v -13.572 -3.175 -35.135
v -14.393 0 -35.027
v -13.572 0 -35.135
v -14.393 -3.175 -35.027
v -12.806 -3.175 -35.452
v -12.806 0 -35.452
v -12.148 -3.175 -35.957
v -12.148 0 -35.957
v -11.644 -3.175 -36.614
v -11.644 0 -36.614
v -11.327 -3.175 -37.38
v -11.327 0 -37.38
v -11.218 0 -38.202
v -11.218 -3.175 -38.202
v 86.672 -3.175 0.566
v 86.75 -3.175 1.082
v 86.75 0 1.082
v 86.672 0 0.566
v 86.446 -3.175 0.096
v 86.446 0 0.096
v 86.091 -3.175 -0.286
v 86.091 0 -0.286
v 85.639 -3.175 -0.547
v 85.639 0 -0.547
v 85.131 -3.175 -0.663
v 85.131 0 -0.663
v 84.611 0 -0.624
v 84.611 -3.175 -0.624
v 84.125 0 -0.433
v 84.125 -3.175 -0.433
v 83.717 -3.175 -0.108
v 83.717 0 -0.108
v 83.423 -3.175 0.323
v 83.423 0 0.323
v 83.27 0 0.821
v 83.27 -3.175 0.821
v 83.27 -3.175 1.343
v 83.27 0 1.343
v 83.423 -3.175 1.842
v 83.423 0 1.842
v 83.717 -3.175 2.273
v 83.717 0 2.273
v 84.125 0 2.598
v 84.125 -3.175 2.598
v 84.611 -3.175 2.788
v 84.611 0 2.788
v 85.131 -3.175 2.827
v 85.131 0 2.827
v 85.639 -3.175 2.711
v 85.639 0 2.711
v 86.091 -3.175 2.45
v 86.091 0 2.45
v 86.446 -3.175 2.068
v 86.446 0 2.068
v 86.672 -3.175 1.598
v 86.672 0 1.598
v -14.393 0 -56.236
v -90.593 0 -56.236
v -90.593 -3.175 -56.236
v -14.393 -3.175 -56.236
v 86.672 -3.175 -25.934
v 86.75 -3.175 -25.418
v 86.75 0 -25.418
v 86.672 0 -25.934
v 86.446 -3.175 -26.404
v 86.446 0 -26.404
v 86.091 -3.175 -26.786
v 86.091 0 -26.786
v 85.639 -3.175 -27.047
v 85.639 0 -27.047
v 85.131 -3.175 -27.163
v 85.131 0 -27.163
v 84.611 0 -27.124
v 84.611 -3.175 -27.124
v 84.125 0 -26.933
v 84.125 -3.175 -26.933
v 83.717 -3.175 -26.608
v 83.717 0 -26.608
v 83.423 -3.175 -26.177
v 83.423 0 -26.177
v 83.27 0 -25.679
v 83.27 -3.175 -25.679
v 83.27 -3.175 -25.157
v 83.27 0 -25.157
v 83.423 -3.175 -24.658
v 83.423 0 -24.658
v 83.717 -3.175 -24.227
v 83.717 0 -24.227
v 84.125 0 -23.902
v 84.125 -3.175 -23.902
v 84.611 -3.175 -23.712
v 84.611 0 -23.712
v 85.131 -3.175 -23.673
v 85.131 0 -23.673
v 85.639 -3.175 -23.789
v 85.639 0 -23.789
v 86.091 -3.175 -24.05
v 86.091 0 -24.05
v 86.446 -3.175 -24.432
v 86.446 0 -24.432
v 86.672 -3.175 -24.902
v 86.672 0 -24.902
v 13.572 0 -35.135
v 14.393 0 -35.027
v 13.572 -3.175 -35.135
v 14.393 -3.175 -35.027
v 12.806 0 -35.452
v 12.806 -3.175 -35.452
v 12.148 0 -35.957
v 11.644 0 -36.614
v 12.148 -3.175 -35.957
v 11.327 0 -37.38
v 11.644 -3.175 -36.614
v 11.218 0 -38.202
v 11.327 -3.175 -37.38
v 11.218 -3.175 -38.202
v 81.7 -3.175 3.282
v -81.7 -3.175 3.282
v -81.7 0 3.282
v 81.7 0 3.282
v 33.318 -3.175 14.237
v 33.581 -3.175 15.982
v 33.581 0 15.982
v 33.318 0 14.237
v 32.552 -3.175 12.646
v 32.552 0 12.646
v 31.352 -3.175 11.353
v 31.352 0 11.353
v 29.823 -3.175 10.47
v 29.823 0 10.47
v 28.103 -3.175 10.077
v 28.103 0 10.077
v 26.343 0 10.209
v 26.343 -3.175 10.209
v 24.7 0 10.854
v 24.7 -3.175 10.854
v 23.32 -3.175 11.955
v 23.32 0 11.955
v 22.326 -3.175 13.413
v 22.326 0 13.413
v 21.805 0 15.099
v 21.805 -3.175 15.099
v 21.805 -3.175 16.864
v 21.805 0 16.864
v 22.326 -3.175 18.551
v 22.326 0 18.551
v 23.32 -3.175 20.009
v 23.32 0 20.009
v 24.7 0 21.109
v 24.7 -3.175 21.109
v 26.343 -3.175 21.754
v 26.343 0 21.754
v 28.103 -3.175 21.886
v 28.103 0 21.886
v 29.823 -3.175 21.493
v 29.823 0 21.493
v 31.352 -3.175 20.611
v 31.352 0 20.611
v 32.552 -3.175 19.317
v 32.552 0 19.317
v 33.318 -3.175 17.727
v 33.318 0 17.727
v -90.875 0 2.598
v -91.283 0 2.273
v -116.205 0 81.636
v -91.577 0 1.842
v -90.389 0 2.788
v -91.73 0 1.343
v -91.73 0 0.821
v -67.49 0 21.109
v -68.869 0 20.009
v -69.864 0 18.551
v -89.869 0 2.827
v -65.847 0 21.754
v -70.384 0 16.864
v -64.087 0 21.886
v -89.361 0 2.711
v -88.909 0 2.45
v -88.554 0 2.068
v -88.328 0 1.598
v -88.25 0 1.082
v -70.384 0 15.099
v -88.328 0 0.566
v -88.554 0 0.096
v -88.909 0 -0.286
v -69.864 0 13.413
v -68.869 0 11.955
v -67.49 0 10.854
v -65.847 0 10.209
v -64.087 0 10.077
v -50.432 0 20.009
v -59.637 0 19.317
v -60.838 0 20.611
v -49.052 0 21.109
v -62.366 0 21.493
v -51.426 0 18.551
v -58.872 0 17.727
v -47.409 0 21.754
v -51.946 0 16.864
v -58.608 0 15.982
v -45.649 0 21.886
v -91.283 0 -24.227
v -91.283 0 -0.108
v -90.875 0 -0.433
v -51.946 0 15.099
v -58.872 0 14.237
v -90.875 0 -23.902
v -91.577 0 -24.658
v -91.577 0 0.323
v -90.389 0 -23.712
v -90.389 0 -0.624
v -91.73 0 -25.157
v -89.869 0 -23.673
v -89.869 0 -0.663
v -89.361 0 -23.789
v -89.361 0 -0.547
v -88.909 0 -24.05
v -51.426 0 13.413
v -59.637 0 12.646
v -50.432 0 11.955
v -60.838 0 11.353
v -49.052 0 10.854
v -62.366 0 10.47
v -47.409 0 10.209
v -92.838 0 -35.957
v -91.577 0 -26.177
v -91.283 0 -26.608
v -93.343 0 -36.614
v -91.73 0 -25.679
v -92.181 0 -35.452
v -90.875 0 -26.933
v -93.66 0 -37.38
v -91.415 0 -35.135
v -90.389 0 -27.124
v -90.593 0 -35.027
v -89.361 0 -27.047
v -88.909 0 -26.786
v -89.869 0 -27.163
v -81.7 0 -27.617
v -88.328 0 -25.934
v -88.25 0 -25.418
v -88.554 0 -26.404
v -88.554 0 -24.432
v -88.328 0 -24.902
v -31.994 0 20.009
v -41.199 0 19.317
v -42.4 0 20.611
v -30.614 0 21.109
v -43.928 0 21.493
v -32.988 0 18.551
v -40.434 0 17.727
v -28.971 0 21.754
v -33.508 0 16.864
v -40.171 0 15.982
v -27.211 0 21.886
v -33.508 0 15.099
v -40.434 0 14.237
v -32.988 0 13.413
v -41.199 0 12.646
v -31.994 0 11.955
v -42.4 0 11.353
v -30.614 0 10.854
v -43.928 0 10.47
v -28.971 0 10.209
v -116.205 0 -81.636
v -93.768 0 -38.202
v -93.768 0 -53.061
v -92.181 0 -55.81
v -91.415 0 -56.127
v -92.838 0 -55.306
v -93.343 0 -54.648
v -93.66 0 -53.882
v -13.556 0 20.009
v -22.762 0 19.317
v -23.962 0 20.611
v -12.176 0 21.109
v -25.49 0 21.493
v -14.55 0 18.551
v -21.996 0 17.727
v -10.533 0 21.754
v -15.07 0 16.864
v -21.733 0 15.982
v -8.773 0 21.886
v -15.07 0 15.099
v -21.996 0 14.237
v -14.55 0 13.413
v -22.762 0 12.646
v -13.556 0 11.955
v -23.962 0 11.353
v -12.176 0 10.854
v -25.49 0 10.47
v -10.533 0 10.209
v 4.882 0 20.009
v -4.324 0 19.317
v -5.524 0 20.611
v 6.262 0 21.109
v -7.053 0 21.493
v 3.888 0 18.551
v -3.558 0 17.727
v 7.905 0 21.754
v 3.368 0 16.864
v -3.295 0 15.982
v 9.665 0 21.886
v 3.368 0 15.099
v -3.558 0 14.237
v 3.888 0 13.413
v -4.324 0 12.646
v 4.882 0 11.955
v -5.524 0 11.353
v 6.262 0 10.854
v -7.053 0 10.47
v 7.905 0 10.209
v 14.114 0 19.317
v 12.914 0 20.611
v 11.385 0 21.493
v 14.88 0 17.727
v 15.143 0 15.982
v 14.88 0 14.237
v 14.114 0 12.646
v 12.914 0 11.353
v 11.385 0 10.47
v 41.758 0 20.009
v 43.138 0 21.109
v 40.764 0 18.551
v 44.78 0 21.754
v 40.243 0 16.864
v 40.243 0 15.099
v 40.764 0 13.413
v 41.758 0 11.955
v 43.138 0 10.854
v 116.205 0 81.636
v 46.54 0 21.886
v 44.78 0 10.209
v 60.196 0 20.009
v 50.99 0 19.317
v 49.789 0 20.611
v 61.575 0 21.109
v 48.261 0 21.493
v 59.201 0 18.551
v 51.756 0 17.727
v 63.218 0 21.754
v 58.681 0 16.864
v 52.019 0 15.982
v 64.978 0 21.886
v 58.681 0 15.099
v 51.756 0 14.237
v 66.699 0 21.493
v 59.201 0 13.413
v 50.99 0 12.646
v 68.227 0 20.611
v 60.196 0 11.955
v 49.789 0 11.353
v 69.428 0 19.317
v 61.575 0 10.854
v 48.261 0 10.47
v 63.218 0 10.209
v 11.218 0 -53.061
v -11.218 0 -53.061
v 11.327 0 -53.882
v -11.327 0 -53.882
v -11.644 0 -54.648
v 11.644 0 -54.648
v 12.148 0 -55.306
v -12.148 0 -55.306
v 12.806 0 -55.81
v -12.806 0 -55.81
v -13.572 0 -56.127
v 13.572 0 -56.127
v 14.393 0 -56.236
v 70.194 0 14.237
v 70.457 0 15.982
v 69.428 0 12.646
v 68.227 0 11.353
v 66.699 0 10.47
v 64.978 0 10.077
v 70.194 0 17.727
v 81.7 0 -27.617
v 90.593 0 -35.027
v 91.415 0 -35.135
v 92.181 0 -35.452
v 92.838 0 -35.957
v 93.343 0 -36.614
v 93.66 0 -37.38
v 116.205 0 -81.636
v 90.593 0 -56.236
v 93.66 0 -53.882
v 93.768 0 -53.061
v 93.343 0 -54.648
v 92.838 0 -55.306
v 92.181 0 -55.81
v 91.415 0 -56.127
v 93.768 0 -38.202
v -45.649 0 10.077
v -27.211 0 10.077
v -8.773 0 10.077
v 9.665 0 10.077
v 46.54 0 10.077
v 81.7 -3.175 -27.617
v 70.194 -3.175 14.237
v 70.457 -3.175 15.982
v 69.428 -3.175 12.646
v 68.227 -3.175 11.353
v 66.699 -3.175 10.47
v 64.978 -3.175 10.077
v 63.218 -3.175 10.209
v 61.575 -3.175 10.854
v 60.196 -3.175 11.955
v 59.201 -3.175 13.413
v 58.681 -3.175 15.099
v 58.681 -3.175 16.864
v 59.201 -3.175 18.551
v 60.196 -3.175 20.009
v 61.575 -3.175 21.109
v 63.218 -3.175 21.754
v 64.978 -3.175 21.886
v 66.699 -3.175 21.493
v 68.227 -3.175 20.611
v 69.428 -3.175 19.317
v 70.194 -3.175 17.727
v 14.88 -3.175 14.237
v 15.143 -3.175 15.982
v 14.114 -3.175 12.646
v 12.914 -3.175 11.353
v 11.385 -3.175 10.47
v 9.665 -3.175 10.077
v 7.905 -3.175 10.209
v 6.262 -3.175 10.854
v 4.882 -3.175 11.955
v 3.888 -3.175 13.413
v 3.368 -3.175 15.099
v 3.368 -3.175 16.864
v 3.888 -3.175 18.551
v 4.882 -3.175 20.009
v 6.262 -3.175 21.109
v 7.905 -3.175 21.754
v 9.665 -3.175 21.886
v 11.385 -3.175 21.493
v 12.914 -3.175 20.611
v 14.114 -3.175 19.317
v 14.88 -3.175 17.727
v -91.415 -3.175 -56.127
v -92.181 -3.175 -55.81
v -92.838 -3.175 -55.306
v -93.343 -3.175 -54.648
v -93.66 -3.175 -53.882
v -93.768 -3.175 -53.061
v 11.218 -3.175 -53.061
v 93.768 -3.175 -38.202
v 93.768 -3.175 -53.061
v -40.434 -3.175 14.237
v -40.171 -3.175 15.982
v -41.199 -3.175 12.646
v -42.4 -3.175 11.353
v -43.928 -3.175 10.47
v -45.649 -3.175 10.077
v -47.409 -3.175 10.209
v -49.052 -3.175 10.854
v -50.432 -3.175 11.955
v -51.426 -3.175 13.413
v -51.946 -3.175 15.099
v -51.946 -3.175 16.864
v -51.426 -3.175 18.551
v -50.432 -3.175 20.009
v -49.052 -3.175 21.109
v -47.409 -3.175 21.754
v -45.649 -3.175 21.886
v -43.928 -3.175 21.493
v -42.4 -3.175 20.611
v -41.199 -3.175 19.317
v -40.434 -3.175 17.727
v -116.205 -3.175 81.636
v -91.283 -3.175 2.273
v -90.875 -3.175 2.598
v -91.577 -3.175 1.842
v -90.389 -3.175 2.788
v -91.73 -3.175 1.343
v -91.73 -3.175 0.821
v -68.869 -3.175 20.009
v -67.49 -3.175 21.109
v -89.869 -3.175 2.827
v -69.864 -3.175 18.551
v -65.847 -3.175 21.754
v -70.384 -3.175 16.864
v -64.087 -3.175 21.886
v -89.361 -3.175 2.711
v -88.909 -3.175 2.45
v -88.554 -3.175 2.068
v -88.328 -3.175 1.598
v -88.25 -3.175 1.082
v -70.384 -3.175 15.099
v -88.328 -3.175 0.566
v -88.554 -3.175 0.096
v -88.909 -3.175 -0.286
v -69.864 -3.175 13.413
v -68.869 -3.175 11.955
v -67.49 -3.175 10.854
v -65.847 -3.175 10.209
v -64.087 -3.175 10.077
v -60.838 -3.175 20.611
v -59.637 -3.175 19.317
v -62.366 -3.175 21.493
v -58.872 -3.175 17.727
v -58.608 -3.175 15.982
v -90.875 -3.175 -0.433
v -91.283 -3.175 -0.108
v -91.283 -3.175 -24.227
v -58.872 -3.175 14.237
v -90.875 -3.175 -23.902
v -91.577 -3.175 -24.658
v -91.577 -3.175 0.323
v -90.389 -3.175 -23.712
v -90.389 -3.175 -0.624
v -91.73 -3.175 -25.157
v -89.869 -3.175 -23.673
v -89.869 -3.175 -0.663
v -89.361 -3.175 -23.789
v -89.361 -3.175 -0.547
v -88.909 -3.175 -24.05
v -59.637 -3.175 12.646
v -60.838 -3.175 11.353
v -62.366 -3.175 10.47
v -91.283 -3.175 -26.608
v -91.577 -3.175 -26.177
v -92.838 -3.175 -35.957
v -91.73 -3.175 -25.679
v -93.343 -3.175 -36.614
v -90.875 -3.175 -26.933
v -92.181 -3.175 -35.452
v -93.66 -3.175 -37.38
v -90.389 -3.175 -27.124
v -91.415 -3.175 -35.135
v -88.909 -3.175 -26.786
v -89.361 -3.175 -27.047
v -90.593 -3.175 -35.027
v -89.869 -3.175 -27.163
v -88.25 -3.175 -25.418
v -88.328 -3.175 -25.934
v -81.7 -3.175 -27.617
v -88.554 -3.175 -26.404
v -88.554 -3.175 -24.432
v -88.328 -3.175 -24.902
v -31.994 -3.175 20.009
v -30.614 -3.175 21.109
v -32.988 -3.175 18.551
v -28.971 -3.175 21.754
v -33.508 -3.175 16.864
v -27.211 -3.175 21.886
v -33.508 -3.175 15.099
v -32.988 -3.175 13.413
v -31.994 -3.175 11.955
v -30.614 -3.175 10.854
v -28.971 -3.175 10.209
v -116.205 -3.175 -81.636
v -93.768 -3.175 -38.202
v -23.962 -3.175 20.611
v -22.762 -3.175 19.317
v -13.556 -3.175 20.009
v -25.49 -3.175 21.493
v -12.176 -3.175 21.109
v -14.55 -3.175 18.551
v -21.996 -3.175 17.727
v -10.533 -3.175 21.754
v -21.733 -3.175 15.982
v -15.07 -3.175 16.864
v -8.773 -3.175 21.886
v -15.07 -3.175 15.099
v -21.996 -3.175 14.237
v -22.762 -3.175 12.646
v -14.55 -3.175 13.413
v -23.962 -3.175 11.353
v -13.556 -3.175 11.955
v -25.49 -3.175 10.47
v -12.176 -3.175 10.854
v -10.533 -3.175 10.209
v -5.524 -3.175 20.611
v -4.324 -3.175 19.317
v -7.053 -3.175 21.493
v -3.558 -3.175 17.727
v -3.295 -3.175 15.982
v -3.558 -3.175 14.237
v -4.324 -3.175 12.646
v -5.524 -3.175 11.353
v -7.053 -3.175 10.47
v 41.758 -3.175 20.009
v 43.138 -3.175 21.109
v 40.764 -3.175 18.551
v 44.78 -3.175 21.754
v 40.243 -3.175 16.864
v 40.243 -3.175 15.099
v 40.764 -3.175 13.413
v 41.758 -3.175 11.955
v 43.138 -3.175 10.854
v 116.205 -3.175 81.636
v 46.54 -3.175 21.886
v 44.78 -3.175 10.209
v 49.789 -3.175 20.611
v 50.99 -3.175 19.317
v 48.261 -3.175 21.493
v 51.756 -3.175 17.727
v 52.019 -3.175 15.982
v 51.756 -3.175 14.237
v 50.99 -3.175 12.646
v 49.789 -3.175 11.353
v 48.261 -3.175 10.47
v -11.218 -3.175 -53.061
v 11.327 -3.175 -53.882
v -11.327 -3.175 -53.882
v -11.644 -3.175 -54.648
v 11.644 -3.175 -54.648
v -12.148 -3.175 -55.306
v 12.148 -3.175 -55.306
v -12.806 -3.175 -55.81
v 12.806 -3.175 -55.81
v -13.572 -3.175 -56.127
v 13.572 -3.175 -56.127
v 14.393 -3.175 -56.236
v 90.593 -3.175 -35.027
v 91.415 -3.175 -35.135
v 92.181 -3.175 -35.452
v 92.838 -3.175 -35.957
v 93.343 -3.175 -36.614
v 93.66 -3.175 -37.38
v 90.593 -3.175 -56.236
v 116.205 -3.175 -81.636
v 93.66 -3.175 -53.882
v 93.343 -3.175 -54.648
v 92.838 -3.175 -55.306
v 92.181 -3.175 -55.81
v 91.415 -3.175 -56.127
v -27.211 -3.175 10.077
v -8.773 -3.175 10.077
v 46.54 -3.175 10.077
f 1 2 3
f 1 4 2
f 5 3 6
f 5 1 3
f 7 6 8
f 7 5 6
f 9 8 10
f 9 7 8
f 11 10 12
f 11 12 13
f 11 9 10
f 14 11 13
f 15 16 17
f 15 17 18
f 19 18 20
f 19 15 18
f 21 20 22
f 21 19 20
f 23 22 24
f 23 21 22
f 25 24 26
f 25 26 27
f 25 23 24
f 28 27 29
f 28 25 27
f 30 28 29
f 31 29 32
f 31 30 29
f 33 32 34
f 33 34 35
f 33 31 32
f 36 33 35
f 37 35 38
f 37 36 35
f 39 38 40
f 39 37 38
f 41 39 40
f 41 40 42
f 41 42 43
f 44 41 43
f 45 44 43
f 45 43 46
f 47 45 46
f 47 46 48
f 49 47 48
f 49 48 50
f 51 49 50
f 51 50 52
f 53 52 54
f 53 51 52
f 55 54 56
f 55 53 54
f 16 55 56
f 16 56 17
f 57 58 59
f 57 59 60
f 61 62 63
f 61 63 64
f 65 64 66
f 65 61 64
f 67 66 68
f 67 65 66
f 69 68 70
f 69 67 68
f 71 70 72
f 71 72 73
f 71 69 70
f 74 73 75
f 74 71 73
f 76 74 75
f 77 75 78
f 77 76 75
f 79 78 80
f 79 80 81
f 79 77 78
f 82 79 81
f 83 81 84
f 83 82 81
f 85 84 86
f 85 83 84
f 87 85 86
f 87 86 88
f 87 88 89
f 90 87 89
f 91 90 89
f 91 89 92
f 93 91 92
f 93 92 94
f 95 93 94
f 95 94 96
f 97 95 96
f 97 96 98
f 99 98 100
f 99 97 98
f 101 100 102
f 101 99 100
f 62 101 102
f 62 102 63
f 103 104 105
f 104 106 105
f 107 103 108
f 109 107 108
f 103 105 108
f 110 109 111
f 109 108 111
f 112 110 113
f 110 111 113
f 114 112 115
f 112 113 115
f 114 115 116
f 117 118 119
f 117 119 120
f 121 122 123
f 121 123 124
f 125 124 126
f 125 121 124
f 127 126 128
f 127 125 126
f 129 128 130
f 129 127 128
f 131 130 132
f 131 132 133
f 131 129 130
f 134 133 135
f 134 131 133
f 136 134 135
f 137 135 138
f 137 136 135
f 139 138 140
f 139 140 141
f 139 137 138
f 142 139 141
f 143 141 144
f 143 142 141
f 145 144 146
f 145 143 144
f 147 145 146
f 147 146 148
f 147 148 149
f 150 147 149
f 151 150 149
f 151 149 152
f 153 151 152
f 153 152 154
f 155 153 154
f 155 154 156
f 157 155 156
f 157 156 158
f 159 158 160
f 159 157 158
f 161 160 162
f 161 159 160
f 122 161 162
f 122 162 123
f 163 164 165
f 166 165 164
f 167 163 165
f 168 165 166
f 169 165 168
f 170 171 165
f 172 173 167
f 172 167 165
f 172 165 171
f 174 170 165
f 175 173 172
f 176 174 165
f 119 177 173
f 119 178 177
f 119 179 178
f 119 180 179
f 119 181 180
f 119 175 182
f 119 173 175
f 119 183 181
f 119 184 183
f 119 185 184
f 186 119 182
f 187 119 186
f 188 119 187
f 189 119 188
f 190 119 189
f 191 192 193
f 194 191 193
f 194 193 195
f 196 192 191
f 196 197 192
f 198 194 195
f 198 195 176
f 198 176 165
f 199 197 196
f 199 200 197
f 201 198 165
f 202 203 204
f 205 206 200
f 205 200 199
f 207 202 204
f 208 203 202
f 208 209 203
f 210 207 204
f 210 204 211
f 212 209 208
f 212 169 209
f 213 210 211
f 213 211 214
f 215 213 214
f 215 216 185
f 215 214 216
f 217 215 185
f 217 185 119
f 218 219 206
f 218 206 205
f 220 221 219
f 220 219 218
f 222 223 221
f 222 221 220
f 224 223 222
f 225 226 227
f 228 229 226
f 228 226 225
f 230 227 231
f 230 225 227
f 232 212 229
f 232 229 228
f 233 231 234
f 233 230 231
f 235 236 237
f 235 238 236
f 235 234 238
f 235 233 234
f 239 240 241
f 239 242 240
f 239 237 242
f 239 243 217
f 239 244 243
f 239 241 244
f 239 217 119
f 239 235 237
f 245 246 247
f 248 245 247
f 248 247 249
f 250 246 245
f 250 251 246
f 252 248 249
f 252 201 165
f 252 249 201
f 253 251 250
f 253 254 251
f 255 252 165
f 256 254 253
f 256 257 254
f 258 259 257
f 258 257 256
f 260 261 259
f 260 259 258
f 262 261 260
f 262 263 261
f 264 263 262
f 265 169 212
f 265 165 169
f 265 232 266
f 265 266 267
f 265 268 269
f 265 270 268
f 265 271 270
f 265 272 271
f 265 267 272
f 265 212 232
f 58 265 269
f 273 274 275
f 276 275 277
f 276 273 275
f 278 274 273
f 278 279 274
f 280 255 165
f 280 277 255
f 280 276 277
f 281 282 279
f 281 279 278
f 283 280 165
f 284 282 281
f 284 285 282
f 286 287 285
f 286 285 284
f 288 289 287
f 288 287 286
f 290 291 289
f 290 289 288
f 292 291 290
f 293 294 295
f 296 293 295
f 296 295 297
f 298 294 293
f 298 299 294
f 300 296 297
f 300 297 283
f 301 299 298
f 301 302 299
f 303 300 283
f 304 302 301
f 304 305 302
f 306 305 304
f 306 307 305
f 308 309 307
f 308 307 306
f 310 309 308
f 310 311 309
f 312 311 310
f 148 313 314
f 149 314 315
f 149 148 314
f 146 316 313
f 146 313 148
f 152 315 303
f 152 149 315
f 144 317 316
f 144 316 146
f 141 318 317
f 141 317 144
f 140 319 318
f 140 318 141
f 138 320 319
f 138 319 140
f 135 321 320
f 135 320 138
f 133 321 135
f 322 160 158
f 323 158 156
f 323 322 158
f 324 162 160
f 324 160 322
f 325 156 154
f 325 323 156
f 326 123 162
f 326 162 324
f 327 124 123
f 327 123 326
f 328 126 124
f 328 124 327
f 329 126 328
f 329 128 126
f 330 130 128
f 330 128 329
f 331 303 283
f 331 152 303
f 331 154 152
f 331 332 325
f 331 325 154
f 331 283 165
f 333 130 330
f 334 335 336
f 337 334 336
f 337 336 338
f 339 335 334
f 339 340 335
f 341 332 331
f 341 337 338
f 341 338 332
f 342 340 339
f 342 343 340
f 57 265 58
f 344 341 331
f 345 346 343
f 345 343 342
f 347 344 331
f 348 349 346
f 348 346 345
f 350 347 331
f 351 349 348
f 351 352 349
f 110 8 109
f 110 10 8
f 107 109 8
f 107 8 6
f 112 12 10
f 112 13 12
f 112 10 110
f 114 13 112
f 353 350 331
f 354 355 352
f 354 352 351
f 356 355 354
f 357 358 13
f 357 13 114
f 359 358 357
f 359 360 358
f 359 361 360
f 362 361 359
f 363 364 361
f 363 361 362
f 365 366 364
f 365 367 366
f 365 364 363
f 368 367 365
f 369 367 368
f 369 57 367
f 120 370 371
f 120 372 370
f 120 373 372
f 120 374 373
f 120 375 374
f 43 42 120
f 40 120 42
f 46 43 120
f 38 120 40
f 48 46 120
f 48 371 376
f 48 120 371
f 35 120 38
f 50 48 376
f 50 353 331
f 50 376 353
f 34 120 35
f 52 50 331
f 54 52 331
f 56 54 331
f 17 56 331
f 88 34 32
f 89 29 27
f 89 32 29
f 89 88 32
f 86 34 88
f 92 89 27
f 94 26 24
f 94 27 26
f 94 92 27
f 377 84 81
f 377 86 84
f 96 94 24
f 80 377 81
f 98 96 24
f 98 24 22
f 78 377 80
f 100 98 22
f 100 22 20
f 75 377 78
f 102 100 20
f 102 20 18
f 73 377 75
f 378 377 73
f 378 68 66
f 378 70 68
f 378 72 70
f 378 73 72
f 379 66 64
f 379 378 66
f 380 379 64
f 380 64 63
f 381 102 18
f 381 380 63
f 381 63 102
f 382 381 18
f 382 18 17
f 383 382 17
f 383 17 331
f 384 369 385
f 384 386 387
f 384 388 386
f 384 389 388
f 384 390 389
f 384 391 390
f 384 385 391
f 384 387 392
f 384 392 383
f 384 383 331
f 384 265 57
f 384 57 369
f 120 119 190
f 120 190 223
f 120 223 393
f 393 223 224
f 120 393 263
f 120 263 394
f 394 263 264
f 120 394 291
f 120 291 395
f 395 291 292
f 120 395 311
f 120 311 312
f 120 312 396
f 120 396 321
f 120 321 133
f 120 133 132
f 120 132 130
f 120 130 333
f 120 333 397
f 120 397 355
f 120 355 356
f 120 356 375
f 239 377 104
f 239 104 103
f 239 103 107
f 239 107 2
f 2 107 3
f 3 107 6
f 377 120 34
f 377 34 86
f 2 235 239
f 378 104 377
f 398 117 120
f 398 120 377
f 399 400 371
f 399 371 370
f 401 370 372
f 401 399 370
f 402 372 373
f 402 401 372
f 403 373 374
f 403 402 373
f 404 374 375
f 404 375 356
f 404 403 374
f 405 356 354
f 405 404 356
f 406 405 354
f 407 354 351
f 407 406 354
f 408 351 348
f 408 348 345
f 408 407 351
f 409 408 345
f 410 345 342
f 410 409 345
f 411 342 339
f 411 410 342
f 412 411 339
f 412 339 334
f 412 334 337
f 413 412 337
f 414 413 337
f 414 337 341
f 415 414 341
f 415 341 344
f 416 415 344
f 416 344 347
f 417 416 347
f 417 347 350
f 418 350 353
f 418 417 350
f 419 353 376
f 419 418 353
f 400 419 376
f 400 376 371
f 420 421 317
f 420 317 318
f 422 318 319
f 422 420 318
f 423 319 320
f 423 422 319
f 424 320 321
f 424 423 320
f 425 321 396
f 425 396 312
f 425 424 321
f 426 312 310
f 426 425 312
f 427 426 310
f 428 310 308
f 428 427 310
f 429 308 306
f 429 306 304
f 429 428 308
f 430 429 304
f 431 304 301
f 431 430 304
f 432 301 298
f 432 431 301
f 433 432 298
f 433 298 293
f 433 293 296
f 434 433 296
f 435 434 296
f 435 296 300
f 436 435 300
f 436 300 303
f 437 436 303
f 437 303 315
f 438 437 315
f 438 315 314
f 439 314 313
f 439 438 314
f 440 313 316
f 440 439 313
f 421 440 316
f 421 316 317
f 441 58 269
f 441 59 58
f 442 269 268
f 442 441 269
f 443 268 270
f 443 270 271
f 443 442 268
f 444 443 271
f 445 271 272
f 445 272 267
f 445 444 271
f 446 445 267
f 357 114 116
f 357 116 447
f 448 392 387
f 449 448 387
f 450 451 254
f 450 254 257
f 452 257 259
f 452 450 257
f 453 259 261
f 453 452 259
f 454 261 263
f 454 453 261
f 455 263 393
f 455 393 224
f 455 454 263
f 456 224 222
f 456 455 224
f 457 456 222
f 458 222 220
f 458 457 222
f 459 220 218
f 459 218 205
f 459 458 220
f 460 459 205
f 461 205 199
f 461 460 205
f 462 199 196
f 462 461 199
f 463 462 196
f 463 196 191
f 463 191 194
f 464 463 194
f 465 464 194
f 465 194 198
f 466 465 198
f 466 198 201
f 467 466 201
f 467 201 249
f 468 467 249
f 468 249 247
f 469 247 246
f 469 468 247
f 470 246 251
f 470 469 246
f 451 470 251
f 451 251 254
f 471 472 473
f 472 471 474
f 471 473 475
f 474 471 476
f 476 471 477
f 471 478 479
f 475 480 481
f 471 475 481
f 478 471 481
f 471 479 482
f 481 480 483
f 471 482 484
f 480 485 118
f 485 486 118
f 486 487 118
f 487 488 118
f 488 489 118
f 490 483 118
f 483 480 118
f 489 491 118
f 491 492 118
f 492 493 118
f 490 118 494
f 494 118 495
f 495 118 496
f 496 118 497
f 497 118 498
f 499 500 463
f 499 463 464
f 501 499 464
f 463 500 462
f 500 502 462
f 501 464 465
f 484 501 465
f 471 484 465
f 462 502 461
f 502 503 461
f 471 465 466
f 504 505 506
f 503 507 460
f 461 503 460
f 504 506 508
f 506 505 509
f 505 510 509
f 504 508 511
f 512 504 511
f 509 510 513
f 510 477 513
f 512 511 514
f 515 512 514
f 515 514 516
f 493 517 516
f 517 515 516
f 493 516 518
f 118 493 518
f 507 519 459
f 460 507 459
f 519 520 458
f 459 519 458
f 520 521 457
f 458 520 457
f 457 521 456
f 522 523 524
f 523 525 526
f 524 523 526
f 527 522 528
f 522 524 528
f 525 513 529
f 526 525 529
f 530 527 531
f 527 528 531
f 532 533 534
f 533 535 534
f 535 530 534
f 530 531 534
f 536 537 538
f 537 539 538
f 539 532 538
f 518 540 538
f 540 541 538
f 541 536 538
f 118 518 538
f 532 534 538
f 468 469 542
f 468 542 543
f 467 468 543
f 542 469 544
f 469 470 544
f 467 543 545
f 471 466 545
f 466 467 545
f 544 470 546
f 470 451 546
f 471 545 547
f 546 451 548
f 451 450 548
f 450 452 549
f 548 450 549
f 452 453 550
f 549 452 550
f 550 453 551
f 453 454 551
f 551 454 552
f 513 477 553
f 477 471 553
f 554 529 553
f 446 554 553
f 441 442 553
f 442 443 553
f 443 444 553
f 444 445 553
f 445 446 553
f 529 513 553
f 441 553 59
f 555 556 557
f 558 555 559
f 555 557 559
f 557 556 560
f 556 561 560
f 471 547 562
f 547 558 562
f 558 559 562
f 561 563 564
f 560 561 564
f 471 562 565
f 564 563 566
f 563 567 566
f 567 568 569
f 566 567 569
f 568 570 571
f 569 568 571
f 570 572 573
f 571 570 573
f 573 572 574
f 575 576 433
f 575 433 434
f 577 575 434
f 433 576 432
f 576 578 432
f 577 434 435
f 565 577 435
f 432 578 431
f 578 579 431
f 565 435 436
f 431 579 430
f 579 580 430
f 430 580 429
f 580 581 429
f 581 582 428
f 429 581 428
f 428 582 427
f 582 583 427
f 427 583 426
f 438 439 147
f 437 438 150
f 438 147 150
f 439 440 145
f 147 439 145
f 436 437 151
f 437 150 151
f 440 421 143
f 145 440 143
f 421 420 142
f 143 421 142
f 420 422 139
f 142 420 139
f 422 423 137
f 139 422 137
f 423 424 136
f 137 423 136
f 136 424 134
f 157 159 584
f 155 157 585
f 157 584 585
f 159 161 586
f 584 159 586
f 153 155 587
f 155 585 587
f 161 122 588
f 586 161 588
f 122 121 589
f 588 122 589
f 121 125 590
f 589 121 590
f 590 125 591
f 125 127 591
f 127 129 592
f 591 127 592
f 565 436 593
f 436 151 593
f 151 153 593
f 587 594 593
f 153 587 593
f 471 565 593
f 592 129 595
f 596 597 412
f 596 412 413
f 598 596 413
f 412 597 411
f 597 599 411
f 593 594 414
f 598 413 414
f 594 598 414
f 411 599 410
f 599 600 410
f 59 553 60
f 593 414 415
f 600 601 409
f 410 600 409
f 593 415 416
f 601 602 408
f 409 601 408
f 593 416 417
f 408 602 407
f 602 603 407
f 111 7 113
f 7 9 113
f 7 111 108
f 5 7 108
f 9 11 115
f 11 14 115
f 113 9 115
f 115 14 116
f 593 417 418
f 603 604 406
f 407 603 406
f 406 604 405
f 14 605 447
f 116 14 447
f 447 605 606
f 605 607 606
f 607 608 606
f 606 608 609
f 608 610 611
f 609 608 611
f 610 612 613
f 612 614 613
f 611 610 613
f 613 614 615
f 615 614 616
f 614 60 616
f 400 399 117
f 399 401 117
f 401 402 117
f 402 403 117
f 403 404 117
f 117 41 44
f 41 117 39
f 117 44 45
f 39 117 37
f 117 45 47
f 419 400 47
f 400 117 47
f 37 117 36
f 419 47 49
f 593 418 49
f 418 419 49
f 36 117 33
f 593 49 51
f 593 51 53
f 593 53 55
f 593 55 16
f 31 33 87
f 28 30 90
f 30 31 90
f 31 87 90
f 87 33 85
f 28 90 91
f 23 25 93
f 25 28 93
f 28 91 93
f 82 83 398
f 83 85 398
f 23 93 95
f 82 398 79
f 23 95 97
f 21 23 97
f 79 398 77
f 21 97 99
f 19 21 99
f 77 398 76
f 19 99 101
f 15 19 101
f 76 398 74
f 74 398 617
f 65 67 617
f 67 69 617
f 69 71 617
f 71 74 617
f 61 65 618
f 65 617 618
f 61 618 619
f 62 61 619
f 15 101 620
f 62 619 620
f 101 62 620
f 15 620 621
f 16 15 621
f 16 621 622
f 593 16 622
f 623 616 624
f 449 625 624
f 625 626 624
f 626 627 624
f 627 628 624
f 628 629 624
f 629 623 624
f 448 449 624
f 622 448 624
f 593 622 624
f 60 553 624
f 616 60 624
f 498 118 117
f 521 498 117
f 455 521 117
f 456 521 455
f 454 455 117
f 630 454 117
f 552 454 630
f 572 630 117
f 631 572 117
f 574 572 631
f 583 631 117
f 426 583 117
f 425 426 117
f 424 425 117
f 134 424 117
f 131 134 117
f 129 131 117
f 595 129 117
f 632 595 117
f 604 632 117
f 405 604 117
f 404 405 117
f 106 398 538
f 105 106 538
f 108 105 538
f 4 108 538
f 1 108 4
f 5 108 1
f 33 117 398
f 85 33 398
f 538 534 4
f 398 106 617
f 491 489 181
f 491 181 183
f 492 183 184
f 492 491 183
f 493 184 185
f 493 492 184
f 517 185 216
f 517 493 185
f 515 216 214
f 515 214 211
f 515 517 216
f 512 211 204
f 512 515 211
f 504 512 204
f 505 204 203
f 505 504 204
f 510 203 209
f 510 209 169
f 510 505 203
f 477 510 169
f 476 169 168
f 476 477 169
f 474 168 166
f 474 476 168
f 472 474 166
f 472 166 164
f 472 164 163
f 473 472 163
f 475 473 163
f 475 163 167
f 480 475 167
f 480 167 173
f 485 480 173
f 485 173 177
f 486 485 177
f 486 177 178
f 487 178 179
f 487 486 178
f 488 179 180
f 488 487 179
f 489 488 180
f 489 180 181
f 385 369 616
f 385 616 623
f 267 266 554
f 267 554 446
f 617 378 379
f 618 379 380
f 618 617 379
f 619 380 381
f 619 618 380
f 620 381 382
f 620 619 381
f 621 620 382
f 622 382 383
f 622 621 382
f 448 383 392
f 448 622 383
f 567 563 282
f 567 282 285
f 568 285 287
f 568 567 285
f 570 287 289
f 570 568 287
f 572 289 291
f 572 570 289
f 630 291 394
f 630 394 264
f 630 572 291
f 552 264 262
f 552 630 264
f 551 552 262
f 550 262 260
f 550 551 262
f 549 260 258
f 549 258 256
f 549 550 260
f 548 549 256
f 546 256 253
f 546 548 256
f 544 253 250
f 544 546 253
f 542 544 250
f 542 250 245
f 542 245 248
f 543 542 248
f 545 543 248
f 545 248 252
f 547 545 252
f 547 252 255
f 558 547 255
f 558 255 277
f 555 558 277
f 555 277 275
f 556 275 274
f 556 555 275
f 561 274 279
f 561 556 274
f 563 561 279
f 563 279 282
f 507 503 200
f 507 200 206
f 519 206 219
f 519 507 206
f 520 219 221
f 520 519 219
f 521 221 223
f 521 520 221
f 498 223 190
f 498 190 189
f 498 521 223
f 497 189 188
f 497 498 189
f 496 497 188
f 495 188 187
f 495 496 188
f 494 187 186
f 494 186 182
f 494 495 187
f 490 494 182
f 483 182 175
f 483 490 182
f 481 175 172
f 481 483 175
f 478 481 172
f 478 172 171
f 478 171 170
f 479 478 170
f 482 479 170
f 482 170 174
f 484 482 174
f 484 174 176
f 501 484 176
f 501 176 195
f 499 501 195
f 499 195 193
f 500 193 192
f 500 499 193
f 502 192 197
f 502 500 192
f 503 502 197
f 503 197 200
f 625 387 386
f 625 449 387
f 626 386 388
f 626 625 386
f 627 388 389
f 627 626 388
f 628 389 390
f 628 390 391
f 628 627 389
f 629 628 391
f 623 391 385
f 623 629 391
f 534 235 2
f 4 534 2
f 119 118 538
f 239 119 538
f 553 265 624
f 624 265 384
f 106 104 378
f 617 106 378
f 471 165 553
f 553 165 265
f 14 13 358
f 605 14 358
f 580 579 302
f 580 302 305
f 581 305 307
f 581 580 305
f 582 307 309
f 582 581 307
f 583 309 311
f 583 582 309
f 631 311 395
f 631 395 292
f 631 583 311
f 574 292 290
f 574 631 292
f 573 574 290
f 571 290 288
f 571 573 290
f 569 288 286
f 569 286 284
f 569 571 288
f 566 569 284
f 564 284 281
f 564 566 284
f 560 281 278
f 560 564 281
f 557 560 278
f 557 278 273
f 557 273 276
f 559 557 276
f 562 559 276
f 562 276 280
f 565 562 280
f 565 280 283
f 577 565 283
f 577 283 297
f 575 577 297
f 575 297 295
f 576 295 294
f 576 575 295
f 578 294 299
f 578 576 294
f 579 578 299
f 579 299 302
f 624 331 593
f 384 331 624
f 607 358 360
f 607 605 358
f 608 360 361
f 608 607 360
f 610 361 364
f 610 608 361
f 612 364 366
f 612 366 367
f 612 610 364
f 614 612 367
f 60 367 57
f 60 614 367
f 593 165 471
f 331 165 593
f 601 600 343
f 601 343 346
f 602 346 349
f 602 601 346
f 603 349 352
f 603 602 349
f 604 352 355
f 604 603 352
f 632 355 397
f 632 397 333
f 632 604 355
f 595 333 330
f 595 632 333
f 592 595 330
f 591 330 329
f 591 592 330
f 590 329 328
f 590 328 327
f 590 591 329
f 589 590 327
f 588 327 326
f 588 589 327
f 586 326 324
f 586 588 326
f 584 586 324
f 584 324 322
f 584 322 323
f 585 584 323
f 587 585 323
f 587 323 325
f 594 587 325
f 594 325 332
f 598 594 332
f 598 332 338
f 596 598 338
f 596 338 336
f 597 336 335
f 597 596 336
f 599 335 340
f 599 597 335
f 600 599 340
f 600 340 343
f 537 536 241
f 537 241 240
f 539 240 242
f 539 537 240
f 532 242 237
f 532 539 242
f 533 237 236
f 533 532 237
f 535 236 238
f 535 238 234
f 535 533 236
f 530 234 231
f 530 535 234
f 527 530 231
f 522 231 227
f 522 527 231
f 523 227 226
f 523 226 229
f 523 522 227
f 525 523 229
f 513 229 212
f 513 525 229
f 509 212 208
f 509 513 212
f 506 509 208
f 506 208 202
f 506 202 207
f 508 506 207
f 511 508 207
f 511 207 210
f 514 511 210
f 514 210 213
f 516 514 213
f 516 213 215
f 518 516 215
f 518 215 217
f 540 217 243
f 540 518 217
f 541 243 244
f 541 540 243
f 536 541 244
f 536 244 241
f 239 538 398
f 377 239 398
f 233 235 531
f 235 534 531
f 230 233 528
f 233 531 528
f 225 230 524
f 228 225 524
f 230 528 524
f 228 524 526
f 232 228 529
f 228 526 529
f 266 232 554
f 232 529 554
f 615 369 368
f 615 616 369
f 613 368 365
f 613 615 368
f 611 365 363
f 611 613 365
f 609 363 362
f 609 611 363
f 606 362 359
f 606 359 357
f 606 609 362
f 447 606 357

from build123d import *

# Parameters (mm, degrees)
SKETCH1_W                = 232.41
SKETCH1_H                = 163.2712
BOSS_EXTRUDE1_DEPTH      = 3.175
SKETCH2_W                = 82.55
SKETCH2_H                = 21.209
CUT_EXTRUDE1_DEPTH       = 143.049476723
FILLET1_R                = 3.175
LPATTERN1_COUNT          = 2
LPATTERN1_PITCH          = 104.9866582
FILLET1_OF_LPATTERN1_R   = 3.175
CUT_EXTRUDE4_START       = -3.175
CUT_EXTRUDE4_OUTLINE_R   = 5.92074
CUT_EXTRUDE4_OUTLINE_W   = 163.40074
CUT_EXTRUDE4_OUTLINE_H   = 30.8991
CUT_EXTRUDE4_OUTLINE_R_2 = 1.75
CUT_EXTRUDE4_DEPTH       = 3.175


# Read off the part's stored shape, not the designer's step: Cut-Extrude4
with BuildPart() as part:
    # Sketch1 → Boss-Extrude1 (new body)
    with BuildSketch(Plane(origin=(0, 0, 0), x_dir=(1, 0, 0), z_dir=(0, 1, 0))):
        Rectangle(SKETCH1_W, SKETCH1_H)
    extrude(amount=-BOSS_EXTRUDE1_DEPTH)

    # Sketch2 → Cut-Extrude1 (cut, through all)
    with BuildSketch(Plane(origin=(0, 0, 0), x_dir=(1, 0, 0), z_dir=(0, 1, 0))):
        with Locations((-52.49333418, 45.6311)):
            Rectangle(SKETCH2_W, SKETCH2_H)
    cut_extrude1 = extrude(amount=-CUT_EXTRUDE1_DEPTH, mode=Mode.SUBTRACT)

    # Fillet1
    fillet1_edges = [part.edges().sort_by_distance(p)[0] for p in [
        (-93.76833418, -1.5875, -35.0266),
        (-93.76833418, -1.5875, -56.2356),
        (-11.21833418, -1.5875, -56.2356),
        (-11.21833418, -1.5875, -35.0266),
    ]]
    fillet(fillet1_edges, radius=FILLET1_R)

    # LPattern1: Cut-Extrude1 ×2
    with Locations(*[(i * LPATTERN1_PITCH, 0, 0) for i in range(1, LPATTERN1_COUNT)]):
        add(cut_extrude1, mode=Mode.SUBTRACT)

    # Fillet1 of LPattern1
    fillet1_of_lpattern1_edges = [part.edges().sort_by_distance(p)[0] for p in [
        (11.21832402, -1.5875, -35.0266),
        (11.21832402, -1.5875, -56.2356),
        (93.76832402, -1.5875, -56.2356),
        (93.76832402, -1.5875, -35.0266),
    ]]
    fillet(fillet1_of_lpattern1_edges, radius=FILLET1_OF_LPATTERN1_R)

    # Cut-Extrude4 outline → Cut-Extrude4 (cut)
    with BuildSketch(Plane(origin=(0, 0, 0), x_dir=(1, 0, 0), z_dir=(0, 1, 0)).offset(CUT_EXTRUDE4_START)):
        with Locations((-64.529208, -15.98168)):
            Circle(CUT_EXTRUDE4_OUTLINE_R)
        with Locations((-46.091348, -15.98168)):
            Circle(CUT_EXTRUDE4_OUTLINE_R)
        with Locations((-27.653488, -15.98168)):
            Circle(CUT_EXTRUDE4_OUTLINE_R)
        with Locations((-9.215628, -15.98168)):
            Circle(CUT_EXTRUDE4_OUTLINE_R)
        with Locations((9.222232, -15.98168)):
            Circle(CUT_EXTRUDE4_OUTLINE_R)
        with Locations((27.660092, -15.98168)):
            Circle(CUT_EXTRUDE4_OUTLINE_R)
        with Locations((46.097952, -15.98168)):
            Circle(CUT_EXTRUDE4_OUTLINE_R)
        with Locations((64.535812, -15.98168)):
            Circle(CUT_EXTRUDE4_OUTLINE_R)
        with Locations((0, 12.16787)):
            Rectangle(CUT_EXTRUDE4_OUTLINE_W, CUT_EXTRUDE4_OUTLINE_H)
        with Locations((-90, 25.41778)):
            Circle(CUT_EXTRUDE4_OUTLINE_R_2)
        with Locations((-90, -1.08222)):
            Circle(CUT_EXTRUDE4_OUTLINE_R_2)
        with Locations((85, -1.08222)):
            Circle(CUT_EXTRUDE4_OUTLINE_R_2)
        with Locations((85, 25.41778)):
            Circle(CUT_EXTRUDE4_OUTLINE_R_2)
    extrude(amount=CUT_EXTRUDE4_DEPTH, mode=Mode.SUBTRACT)


solid = part.part
